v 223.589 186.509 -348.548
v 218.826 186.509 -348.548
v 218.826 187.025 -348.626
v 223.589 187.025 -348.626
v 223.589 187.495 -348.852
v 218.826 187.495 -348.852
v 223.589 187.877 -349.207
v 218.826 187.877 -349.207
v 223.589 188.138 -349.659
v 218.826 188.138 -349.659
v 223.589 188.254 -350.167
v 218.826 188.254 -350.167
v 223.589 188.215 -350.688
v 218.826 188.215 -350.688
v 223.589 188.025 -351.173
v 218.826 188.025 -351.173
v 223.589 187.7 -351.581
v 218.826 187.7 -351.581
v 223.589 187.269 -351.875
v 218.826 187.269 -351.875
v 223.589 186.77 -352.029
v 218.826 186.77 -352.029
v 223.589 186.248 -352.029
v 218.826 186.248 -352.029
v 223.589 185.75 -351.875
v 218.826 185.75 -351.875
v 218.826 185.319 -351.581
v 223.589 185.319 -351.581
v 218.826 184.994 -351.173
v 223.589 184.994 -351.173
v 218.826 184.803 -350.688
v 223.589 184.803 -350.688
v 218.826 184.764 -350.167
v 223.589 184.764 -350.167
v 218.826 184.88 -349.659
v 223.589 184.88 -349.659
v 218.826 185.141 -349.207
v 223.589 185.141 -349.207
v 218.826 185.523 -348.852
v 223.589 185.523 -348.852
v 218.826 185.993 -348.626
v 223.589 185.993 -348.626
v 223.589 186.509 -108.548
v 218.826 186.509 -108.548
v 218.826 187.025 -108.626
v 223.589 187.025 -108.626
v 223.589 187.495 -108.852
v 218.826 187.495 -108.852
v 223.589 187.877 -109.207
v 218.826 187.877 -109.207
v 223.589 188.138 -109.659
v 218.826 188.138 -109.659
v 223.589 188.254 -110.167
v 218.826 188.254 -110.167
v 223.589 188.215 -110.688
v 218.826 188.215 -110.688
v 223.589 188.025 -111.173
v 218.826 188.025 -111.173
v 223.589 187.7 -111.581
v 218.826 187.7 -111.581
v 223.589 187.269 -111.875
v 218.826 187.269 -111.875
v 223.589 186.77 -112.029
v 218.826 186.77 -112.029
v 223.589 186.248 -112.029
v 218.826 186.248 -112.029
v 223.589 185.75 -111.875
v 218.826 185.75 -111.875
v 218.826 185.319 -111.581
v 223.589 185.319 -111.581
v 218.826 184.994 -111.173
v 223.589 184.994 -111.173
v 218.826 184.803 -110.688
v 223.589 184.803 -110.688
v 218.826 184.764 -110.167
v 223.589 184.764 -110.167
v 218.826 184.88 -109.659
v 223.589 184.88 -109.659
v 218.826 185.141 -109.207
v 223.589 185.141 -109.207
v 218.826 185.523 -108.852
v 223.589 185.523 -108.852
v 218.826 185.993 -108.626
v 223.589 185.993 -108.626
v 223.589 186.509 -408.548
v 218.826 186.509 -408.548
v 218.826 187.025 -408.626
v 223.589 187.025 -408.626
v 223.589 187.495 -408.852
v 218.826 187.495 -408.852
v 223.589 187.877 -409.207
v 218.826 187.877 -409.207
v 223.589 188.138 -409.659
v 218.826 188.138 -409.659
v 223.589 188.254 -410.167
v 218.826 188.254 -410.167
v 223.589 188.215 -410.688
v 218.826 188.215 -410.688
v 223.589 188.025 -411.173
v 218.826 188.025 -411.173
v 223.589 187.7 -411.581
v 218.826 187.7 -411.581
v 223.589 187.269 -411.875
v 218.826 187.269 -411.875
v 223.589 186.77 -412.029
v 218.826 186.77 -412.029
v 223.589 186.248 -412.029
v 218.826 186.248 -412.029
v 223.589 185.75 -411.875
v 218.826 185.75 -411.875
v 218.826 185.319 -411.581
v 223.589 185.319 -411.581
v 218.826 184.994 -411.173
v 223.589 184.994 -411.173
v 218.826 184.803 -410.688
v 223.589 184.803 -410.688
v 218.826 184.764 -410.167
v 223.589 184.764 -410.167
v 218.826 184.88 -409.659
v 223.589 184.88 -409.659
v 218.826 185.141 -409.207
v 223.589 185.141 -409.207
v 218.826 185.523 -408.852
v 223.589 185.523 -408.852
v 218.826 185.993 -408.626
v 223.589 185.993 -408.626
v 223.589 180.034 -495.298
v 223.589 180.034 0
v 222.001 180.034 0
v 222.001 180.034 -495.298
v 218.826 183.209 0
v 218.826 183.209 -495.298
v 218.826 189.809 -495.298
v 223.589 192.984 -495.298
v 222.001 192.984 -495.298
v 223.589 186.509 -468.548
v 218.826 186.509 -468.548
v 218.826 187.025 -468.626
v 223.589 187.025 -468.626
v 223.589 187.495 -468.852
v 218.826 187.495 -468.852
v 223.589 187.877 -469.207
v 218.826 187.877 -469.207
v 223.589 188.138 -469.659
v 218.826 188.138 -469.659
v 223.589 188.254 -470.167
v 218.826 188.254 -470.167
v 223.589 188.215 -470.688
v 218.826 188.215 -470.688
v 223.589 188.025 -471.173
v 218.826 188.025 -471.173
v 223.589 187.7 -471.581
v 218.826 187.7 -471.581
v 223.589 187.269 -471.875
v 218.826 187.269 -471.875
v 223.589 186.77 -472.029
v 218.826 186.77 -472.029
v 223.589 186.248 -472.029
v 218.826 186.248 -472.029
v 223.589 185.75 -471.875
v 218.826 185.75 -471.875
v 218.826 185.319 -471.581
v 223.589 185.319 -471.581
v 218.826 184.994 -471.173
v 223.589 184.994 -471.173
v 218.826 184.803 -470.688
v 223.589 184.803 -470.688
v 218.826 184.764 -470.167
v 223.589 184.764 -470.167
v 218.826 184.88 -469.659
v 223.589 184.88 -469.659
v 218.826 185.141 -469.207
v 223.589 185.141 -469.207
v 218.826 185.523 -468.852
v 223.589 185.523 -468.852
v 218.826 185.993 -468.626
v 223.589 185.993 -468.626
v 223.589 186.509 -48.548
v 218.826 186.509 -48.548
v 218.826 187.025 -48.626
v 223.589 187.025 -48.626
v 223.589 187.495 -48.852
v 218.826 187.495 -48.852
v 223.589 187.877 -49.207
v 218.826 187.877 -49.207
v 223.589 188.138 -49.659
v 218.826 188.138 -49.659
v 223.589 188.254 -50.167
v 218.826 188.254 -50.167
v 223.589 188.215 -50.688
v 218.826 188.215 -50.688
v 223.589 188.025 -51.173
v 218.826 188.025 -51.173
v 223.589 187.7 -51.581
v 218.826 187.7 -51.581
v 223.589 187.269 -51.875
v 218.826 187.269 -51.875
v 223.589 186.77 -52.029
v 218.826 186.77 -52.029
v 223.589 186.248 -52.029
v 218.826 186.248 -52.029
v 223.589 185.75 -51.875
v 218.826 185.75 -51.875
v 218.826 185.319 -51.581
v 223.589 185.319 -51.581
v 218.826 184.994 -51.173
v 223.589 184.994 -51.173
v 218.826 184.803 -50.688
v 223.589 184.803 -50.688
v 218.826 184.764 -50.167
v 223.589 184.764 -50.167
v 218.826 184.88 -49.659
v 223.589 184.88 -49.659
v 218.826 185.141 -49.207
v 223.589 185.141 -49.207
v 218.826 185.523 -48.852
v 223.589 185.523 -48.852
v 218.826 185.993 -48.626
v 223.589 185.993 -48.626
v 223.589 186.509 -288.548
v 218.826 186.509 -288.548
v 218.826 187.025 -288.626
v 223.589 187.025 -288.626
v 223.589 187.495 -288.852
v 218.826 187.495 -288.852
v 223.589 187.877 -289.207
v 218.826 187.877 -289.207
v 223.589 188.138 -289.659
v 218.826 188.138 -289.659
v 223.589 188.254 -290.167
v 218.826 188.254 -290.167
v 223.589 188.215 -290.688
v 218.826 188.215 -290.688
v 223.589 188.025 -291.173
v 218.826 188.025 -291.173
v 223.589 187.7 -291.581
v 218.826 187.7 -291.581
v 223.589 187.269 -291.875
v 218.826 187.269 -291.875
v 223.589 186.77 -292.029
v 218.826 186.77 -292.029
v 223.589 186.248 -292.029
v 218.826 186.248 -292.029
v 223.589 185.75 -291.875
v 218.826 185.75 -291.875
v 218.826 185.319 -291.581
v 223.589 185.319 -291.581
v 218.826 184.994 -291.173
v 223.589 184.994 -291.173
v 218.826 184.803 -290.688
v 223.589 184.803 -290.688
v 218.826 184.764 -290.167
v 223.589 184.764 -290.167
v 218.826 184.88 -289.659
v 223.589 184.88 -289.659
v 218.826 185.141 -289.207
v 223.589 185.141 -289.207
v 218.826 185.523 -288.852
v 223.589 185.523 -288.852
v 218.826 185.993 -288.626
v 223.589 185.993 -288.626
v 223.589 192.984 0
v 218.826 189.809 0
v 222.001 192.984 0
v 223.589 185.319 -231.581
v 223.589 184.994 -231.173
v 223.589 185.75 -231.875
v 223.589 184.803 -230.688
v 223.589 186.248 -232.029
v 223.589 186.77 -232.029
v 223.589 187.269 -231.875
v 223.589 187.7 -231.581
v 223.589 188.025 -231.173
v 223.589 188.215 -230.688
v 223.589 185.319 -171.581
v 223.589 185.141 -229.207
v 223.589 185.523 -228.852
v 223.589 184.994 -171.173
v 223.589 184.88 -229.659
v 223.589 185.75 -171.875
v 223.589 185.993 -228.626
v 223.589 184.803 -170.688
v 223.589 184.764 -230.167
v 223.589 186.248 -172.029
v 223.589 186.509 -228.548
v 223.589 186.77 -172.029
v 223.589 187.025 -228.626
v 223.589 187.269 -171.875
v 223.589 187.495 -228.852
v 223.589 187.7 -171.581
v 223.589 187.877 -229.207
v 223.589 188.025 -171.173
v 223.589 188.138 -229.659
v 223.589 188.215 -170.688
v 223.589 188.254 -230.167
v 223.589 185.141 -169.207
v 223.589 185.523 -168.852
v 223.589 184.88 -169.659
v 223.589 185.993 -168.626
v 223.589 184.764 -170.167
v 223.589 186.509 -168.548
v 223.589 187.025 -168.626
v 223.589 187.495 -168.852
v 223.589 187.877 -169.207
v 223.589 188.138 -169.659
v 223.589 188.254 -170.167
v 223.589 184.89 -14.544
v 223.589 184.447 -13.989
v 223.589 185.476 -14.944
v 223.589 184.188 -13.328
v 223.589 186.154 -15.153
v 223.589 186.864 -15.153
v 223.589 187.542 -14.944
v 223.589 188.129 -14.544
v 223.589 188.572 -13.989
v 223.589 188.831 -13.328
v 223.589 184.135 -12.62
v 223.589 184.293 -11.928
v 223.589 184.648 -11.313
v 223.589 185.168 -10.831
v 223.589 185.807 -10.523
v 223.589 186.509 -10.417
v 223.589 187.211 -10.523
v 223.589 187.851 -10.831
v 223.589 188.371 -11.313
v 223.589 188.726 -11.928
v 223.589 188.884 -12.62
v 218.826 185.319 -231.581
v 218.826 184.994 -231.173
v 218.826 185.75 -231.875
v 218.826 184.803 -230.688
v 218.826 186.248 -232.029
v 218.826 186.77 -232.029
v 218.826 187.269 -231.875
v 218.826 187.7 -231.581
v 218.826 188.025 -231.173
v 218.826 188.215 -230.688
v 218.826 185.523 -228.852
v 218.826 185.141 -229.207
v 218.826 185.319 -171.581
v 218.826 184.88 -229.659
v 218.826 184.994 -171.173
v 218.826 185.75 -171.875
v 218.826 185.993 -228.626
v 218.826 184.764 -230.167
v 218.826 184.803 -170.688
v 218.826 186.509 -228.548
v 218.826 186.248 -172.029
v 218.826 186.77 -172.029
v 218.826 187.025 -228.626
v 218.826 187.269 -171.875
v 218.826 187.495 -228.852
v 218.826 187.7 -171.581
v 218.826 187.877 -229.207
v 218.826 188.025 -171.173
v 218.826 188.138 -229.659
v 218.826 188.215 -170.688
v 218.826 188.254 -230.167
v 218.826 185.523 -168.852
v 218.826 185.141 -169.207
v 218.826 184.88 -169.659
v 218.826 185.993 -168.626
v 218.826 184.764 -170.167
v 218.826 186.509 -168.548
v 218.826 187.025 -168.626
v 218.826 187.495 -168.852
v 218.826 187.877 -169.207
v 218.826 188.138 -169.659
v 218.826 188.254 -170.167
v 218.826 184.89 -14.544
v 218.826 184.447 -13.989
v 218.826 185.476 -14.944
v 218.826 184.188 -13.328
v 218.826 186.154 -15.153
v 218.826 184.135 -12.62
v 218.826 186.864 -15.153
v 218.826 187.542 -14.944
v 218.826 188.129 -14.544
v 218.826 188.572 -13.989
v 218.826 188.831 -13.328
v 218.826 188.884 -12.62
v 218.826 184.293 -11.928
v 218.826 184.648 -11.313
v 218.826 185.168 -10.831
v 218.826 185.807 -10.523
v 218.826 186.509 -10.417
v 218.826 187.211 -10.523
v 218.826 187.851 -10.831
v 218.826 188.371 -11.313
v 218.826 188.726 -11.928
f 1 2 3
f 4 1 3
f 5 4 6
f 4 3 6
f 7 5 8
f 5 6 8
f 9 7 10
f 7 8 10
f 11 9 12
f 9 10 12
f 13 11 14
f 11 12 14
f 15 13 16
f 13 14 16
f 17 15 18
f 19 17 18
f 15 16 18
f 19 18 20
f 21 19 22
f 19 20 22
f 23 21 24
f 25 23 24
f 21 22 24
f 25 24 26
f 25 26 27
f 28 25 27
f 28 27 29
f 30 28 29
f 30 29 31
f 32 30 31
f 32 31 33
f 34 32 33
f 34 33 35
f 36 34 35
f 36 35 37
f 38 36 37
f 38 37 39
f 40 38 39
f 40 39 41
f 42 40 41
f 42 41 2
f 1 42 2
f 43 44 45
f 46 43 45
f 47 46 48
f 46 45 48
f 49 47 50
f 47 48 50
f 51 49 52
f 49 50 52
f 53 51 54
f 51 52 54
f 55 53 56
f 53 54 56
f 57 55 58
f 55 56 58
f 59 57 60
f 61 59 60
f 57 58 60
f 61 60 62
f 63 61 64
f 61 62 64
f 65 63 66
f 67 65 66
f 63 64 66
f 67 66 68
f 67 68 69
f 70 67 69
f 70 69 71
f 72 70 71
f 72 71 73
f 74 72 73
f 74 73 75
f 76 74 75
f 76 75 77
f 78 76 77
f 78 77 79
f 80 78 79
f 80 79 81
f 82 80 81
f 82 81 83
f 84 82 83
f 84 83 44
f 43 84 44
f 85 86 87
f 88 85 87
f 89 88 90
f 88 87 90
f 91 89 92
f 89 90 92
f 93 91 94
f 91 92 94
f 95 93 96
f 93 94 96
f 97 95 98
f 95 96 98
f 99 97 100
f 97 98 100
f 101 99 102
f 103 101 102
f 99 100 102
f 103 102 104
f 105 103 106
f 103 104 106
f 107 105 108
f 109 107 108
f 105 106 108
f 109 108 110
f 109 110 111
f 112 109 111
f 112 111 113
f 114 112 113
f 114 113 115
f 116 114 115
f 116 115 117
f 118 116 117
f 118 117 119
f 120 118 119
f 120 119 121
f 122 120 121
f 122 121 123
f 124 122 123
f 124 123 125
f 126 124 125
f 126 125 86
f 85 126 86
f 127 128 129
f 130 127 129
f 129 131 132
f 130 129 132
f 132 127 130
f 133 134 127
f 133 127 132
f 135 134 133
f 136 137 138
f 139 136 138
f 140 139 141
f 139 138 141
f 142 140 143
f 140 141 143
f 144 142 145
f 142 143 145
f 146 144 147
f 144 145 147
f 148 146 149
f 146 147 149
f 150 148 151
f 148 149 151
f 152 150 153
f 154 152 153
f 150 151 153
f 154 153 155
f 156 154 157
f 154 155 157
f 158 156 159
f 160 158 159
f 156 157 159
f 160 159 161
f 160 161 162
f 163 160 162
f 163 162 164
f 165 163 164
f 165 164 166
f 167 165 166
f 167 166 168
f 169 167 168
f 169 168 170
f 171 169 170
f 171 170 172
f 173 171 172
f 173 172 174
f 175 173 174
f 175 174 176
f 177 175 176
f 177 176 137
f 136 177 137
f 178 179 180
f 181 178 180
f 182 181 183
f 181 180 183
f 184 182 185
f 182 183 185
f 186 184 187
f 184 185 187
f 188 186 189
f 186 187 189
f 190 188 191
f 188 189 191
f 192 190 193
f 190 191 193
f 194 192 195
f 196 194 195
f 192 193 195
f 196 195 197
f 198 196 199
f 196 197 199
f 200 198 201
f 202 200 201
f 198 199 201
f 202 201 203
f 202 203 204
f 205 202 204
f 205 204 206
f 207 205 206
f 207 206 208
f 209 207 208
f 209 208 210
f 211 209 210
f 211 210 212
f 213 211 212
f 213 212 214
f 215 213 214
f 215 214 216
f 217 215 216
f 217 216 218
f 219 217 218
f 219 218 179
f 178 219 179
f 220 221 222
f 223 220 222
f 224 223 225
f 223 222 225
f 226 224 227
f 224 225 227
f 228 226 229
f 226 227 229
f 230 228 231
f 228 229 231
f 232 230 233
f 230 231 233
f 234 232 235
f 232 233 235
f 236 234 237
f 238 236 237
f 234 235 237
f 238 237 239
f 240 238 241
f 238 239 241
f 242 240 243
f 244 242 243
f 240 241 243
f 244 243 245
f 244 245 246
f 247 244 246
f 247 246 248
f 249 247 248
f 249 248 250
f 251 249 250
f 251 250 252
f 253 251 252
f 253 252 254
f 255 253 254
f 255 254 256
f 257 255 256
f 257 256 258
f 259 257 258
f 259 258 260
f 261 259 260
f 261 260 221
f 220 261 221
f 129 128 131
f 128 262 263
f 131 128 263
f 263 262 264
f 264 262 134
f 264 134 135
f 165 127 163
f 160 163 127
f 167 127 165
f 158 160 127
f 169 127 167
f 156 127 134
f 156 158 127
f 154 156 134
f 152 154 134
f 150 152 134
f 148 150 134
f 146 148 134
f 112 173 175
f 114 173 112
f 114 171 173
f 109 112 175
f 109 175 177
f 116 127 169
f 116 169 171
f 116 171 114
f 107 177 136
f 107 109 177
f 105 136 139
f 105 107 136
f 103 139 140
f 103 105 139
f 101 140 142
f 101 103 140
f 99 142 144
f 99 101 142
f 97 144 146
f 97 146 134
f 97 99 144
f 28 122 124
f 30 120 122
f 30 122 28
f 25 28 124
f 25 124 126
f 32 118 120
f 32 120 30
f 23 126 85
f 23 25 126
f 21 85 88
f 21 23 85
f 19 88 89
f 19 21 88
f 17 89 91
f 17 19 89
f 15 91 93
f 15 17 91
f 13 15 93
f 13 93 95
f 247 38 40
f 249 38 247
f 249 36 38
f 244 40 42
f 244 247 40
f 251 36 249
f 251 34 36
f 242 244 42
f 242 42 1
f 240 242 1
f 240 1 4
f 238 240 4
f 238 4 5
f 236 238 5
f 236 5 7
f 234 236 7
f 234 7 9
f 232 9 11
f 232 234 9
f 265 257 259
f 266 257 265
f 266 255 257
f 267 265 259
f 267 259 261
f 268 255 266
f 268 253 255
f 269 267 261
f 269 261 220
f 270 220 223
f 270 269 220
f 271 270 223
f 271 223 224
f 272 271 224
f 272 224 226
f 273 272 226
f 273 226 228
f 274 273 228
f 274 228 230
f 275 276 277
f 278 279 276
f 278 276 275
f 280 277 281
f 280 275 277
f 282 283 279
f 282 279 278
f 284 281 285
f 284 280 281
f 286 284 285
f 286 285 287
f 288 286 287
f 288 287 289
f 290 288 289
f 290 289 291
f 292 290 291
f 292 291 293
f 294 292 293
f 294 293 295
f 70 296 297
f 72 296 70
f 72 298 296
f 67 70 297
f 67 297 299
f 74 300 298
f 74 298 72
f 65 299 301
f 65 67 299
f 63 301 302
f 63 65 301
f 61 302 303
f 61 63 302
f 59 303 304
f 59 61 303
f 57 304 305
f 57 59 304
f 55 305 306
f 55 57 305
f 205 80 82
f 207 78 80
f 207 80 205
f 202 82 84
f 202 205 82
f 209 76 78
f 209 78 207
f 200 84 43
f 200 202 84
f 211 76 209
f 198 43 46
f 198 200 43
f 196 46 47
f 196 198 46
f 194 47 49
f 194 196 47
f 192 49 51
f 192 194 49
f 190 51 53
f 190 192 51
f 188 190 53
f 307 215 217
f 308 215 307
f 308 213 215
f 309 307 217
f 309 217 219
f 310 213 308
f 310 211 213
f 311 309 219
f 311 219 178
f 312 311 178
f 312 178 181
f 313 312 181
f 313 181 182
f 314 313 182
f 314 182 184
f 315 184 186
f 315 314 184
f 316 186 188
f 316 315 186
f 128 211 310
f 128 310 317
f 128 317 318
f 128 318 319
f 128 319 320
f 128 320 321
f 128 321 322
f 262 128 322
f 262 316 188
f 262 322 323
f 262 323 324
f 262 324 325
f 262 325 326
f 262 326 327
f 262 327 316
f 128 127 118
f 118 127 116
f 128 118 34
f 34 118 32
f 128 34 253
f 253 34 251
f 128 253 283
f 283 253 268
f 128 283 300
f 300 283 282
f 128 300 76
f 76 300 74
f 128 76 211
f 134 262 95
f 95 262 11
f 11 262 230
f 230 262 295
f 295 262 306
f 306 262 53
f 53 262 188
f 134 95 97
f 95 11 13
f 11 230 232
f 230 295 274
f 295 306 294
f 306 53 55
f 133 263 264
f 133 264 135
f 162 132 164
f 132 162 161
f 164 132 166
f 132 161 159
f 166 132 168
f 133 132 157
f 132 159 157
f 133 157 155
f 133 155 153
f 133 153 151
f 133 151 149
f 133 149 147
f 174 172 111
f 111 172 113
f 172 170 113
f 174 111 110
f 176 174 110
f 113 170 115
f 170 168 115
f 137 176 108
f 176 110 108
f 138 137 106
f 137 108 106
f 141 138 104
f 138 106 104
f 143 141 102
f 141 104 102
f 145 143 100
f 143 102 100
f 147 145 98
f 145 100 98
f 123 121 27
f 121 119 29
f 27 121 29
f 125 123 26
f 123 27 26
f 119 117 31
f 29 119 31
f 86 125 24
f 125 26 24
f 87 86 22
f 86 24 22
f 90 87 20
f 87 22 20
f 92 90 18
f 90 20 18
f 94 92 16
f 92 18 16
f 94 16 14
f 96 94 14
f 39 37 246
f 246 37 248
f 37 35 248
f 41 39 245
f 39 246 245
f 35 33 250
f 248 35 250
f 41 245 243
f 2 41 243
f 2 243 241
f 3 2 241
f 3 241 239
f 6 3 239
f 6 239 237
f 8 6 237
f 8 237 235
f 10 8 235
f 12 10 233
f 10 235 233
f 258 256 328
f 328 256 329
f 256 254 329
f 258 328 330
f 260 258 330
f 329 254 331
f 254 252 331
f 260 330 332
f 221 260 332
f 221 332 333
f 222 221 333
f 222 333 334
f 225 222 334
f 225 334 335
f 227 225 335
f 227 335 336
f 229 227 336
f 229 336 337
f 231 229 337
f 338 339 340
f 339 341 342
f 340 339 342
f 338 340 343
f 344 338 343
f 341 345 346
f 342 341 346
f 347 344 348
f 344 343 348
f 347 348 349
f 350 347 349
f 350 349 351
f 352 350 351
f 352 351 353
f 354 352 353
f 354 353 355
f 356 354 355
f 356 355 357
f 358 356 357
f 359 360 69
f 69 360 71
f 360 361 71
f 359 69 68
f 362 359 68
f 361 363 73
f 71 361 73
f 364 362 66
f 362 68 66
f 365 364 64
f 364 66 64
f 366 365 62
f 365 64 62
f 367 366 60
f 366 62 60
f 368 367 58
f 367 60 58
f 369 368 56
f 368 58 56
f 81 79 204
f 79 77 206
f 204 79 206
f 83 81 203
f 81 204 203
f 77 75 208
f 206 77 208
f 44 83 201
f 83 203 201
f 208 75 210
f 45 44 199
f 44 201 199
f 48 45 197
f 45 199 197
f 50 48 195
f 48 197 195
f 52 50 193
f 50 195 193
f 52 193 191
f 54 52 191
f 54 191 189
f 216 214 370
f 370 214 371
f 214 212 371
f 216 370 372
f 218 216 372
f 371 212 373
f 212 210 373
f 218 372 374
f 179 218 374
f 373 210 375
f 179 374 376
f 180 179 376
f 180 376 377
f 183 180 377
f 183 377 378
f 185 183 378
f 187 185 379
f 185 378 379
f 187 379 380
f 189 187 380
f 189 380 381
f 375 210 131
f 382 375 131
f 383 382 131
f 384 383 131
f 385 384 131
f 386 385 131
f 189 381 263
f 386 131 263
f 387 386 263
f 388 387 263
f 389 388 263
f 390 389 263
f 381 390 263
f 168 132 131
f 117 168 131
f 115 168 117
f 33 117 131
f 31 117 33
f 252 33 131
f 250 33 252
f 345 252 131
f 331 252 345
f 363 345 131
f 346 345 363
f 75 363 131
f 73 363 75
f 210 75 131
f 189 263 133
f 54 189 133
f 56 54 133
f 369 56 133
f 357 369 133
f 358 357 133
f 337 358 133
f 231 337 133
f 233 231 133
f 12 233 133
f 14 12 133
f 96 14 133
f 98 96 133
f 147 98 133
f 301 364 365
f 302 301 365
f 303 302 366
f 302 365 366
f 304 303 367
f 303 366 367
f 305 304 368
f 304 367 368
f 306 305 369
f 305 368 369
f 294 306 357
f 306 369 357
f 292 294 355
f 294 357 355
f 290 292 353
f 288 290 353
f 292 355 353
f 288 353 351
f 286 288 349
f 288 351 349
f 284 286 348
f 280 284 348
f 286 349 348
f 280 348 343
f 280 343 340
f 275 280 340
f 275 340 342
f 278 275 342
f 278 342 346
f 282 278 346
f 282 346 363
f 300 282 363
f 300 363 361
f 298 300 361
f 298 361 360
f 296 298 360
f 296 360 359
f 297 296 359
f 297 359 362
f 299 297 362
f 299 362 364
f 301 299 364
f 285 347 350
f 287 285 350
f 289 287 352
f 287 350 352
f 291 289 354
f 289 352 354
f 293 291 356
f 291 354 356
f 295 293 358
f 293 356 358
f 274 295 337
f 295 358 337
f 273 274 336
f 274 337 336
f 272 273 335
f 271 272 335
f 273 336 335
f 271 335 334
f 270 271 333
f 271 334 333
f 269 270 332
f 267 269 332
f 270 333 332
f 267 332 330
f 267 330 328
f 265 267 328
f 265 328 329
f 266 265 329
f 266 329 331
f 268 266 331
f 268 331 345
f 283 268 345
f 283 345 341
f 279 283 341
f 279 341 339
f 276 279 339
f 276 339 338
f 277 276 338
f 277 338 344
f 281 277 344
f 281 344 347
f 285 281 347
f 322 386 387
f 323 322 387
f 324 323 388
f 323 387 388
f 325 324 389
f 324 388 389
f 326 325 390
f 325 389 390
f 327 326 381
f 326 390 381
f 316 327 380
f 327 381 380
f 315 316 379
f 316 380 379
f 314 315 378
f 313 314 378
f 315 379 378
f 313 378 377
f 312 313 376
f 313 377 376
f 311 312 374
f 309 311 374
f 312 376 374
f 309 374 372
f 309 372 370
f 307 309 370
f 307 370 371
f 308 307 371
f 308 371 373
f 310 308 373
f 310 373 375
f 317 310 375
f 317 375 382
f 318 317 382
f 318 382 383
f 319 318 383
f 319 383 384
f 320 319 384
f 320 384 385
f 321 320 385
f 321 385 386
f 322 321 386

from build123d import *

# Parameters (mm, degrees)
SKETCH1_W                         = 4.7625
SKETCH1_H                         = 12.949588911
BOSS_EXTRUDE1_DEPTH               = 495.29818
F_1_4_0_1875_DIAMETER_HOLE1_D     = 4.7625
F_1_4_0_1875_DIAMETER_HOLE1_DEPTH = 4.7625
CHAMFER1_SIZE                     = 3.175
F_3_0MM_DOWEL_HOLE1_D             = 3.5
F_3_0MM_DOWEL_HOLE1_DEPTH         = 4.7625


with BuildPart() as part:
    # Sketch1 → Boss-Extrude1 (new body)
    with BuildSketch(Plane(origin=(0, 0, 0), x_dir=(-1, 0, 0), z_dir=(0, 0, -1))):
        with Locations((-221.207335178, 186.509282679)):
            Rectangle(SKETCH1_W, SKETCH1_H)
    extrude(amount=BOSS_EXTRUDE1_DEPTH)

    # 1/4 (0.1875) Diameter Hole1
    with Locations(Plane(origin=(223.588585178, 0, 0), x_dir=(0, 0, -1), z_dir=(1, 0, 0))):
        with Locations((12.798180471, 186.509282679)):
            Hole(F_1_4_0_1875_DIAMETER_HOLE1_D / 2, depth=F_1_4_0_1875_DIAMETER_HOLE1_DEPTH)

    # Chamfer1
    chamfer1_edges = [part.edges().sort_by_distance(p)[0] for p in [
        (218.826085178, 180.034488223, -247.64909),
        (218.826085178, 192.984077134, -247.64909),
    ]]
    chamfer(chamfer1_edges, length=CHAMFER1_SIZE)

    # Ø3.0mm Dowel Hole1
    with Locations(Plane(origin=(223.588585178, 0, 0), x_dir=(0, 0, -1), z_dir=(1, 0, 0))):
        with Locations((470.298180445, 186.509282678), (410.298180445, 186.509282678), (350.298180445, 186.509282678), (290.298180445, 186.509282678), (170.298180445, 186.509282678), (110.298180445, 186.509282678), (50.298180445, 186.509282678), (230.298180445, 186.509282678)):
            Hole(F_3_0MM_DOWEL_HOLE1_D / 2, depth=F_3_0MM_DOWEL_HOLE1_DEPTH)


solid = part.part
